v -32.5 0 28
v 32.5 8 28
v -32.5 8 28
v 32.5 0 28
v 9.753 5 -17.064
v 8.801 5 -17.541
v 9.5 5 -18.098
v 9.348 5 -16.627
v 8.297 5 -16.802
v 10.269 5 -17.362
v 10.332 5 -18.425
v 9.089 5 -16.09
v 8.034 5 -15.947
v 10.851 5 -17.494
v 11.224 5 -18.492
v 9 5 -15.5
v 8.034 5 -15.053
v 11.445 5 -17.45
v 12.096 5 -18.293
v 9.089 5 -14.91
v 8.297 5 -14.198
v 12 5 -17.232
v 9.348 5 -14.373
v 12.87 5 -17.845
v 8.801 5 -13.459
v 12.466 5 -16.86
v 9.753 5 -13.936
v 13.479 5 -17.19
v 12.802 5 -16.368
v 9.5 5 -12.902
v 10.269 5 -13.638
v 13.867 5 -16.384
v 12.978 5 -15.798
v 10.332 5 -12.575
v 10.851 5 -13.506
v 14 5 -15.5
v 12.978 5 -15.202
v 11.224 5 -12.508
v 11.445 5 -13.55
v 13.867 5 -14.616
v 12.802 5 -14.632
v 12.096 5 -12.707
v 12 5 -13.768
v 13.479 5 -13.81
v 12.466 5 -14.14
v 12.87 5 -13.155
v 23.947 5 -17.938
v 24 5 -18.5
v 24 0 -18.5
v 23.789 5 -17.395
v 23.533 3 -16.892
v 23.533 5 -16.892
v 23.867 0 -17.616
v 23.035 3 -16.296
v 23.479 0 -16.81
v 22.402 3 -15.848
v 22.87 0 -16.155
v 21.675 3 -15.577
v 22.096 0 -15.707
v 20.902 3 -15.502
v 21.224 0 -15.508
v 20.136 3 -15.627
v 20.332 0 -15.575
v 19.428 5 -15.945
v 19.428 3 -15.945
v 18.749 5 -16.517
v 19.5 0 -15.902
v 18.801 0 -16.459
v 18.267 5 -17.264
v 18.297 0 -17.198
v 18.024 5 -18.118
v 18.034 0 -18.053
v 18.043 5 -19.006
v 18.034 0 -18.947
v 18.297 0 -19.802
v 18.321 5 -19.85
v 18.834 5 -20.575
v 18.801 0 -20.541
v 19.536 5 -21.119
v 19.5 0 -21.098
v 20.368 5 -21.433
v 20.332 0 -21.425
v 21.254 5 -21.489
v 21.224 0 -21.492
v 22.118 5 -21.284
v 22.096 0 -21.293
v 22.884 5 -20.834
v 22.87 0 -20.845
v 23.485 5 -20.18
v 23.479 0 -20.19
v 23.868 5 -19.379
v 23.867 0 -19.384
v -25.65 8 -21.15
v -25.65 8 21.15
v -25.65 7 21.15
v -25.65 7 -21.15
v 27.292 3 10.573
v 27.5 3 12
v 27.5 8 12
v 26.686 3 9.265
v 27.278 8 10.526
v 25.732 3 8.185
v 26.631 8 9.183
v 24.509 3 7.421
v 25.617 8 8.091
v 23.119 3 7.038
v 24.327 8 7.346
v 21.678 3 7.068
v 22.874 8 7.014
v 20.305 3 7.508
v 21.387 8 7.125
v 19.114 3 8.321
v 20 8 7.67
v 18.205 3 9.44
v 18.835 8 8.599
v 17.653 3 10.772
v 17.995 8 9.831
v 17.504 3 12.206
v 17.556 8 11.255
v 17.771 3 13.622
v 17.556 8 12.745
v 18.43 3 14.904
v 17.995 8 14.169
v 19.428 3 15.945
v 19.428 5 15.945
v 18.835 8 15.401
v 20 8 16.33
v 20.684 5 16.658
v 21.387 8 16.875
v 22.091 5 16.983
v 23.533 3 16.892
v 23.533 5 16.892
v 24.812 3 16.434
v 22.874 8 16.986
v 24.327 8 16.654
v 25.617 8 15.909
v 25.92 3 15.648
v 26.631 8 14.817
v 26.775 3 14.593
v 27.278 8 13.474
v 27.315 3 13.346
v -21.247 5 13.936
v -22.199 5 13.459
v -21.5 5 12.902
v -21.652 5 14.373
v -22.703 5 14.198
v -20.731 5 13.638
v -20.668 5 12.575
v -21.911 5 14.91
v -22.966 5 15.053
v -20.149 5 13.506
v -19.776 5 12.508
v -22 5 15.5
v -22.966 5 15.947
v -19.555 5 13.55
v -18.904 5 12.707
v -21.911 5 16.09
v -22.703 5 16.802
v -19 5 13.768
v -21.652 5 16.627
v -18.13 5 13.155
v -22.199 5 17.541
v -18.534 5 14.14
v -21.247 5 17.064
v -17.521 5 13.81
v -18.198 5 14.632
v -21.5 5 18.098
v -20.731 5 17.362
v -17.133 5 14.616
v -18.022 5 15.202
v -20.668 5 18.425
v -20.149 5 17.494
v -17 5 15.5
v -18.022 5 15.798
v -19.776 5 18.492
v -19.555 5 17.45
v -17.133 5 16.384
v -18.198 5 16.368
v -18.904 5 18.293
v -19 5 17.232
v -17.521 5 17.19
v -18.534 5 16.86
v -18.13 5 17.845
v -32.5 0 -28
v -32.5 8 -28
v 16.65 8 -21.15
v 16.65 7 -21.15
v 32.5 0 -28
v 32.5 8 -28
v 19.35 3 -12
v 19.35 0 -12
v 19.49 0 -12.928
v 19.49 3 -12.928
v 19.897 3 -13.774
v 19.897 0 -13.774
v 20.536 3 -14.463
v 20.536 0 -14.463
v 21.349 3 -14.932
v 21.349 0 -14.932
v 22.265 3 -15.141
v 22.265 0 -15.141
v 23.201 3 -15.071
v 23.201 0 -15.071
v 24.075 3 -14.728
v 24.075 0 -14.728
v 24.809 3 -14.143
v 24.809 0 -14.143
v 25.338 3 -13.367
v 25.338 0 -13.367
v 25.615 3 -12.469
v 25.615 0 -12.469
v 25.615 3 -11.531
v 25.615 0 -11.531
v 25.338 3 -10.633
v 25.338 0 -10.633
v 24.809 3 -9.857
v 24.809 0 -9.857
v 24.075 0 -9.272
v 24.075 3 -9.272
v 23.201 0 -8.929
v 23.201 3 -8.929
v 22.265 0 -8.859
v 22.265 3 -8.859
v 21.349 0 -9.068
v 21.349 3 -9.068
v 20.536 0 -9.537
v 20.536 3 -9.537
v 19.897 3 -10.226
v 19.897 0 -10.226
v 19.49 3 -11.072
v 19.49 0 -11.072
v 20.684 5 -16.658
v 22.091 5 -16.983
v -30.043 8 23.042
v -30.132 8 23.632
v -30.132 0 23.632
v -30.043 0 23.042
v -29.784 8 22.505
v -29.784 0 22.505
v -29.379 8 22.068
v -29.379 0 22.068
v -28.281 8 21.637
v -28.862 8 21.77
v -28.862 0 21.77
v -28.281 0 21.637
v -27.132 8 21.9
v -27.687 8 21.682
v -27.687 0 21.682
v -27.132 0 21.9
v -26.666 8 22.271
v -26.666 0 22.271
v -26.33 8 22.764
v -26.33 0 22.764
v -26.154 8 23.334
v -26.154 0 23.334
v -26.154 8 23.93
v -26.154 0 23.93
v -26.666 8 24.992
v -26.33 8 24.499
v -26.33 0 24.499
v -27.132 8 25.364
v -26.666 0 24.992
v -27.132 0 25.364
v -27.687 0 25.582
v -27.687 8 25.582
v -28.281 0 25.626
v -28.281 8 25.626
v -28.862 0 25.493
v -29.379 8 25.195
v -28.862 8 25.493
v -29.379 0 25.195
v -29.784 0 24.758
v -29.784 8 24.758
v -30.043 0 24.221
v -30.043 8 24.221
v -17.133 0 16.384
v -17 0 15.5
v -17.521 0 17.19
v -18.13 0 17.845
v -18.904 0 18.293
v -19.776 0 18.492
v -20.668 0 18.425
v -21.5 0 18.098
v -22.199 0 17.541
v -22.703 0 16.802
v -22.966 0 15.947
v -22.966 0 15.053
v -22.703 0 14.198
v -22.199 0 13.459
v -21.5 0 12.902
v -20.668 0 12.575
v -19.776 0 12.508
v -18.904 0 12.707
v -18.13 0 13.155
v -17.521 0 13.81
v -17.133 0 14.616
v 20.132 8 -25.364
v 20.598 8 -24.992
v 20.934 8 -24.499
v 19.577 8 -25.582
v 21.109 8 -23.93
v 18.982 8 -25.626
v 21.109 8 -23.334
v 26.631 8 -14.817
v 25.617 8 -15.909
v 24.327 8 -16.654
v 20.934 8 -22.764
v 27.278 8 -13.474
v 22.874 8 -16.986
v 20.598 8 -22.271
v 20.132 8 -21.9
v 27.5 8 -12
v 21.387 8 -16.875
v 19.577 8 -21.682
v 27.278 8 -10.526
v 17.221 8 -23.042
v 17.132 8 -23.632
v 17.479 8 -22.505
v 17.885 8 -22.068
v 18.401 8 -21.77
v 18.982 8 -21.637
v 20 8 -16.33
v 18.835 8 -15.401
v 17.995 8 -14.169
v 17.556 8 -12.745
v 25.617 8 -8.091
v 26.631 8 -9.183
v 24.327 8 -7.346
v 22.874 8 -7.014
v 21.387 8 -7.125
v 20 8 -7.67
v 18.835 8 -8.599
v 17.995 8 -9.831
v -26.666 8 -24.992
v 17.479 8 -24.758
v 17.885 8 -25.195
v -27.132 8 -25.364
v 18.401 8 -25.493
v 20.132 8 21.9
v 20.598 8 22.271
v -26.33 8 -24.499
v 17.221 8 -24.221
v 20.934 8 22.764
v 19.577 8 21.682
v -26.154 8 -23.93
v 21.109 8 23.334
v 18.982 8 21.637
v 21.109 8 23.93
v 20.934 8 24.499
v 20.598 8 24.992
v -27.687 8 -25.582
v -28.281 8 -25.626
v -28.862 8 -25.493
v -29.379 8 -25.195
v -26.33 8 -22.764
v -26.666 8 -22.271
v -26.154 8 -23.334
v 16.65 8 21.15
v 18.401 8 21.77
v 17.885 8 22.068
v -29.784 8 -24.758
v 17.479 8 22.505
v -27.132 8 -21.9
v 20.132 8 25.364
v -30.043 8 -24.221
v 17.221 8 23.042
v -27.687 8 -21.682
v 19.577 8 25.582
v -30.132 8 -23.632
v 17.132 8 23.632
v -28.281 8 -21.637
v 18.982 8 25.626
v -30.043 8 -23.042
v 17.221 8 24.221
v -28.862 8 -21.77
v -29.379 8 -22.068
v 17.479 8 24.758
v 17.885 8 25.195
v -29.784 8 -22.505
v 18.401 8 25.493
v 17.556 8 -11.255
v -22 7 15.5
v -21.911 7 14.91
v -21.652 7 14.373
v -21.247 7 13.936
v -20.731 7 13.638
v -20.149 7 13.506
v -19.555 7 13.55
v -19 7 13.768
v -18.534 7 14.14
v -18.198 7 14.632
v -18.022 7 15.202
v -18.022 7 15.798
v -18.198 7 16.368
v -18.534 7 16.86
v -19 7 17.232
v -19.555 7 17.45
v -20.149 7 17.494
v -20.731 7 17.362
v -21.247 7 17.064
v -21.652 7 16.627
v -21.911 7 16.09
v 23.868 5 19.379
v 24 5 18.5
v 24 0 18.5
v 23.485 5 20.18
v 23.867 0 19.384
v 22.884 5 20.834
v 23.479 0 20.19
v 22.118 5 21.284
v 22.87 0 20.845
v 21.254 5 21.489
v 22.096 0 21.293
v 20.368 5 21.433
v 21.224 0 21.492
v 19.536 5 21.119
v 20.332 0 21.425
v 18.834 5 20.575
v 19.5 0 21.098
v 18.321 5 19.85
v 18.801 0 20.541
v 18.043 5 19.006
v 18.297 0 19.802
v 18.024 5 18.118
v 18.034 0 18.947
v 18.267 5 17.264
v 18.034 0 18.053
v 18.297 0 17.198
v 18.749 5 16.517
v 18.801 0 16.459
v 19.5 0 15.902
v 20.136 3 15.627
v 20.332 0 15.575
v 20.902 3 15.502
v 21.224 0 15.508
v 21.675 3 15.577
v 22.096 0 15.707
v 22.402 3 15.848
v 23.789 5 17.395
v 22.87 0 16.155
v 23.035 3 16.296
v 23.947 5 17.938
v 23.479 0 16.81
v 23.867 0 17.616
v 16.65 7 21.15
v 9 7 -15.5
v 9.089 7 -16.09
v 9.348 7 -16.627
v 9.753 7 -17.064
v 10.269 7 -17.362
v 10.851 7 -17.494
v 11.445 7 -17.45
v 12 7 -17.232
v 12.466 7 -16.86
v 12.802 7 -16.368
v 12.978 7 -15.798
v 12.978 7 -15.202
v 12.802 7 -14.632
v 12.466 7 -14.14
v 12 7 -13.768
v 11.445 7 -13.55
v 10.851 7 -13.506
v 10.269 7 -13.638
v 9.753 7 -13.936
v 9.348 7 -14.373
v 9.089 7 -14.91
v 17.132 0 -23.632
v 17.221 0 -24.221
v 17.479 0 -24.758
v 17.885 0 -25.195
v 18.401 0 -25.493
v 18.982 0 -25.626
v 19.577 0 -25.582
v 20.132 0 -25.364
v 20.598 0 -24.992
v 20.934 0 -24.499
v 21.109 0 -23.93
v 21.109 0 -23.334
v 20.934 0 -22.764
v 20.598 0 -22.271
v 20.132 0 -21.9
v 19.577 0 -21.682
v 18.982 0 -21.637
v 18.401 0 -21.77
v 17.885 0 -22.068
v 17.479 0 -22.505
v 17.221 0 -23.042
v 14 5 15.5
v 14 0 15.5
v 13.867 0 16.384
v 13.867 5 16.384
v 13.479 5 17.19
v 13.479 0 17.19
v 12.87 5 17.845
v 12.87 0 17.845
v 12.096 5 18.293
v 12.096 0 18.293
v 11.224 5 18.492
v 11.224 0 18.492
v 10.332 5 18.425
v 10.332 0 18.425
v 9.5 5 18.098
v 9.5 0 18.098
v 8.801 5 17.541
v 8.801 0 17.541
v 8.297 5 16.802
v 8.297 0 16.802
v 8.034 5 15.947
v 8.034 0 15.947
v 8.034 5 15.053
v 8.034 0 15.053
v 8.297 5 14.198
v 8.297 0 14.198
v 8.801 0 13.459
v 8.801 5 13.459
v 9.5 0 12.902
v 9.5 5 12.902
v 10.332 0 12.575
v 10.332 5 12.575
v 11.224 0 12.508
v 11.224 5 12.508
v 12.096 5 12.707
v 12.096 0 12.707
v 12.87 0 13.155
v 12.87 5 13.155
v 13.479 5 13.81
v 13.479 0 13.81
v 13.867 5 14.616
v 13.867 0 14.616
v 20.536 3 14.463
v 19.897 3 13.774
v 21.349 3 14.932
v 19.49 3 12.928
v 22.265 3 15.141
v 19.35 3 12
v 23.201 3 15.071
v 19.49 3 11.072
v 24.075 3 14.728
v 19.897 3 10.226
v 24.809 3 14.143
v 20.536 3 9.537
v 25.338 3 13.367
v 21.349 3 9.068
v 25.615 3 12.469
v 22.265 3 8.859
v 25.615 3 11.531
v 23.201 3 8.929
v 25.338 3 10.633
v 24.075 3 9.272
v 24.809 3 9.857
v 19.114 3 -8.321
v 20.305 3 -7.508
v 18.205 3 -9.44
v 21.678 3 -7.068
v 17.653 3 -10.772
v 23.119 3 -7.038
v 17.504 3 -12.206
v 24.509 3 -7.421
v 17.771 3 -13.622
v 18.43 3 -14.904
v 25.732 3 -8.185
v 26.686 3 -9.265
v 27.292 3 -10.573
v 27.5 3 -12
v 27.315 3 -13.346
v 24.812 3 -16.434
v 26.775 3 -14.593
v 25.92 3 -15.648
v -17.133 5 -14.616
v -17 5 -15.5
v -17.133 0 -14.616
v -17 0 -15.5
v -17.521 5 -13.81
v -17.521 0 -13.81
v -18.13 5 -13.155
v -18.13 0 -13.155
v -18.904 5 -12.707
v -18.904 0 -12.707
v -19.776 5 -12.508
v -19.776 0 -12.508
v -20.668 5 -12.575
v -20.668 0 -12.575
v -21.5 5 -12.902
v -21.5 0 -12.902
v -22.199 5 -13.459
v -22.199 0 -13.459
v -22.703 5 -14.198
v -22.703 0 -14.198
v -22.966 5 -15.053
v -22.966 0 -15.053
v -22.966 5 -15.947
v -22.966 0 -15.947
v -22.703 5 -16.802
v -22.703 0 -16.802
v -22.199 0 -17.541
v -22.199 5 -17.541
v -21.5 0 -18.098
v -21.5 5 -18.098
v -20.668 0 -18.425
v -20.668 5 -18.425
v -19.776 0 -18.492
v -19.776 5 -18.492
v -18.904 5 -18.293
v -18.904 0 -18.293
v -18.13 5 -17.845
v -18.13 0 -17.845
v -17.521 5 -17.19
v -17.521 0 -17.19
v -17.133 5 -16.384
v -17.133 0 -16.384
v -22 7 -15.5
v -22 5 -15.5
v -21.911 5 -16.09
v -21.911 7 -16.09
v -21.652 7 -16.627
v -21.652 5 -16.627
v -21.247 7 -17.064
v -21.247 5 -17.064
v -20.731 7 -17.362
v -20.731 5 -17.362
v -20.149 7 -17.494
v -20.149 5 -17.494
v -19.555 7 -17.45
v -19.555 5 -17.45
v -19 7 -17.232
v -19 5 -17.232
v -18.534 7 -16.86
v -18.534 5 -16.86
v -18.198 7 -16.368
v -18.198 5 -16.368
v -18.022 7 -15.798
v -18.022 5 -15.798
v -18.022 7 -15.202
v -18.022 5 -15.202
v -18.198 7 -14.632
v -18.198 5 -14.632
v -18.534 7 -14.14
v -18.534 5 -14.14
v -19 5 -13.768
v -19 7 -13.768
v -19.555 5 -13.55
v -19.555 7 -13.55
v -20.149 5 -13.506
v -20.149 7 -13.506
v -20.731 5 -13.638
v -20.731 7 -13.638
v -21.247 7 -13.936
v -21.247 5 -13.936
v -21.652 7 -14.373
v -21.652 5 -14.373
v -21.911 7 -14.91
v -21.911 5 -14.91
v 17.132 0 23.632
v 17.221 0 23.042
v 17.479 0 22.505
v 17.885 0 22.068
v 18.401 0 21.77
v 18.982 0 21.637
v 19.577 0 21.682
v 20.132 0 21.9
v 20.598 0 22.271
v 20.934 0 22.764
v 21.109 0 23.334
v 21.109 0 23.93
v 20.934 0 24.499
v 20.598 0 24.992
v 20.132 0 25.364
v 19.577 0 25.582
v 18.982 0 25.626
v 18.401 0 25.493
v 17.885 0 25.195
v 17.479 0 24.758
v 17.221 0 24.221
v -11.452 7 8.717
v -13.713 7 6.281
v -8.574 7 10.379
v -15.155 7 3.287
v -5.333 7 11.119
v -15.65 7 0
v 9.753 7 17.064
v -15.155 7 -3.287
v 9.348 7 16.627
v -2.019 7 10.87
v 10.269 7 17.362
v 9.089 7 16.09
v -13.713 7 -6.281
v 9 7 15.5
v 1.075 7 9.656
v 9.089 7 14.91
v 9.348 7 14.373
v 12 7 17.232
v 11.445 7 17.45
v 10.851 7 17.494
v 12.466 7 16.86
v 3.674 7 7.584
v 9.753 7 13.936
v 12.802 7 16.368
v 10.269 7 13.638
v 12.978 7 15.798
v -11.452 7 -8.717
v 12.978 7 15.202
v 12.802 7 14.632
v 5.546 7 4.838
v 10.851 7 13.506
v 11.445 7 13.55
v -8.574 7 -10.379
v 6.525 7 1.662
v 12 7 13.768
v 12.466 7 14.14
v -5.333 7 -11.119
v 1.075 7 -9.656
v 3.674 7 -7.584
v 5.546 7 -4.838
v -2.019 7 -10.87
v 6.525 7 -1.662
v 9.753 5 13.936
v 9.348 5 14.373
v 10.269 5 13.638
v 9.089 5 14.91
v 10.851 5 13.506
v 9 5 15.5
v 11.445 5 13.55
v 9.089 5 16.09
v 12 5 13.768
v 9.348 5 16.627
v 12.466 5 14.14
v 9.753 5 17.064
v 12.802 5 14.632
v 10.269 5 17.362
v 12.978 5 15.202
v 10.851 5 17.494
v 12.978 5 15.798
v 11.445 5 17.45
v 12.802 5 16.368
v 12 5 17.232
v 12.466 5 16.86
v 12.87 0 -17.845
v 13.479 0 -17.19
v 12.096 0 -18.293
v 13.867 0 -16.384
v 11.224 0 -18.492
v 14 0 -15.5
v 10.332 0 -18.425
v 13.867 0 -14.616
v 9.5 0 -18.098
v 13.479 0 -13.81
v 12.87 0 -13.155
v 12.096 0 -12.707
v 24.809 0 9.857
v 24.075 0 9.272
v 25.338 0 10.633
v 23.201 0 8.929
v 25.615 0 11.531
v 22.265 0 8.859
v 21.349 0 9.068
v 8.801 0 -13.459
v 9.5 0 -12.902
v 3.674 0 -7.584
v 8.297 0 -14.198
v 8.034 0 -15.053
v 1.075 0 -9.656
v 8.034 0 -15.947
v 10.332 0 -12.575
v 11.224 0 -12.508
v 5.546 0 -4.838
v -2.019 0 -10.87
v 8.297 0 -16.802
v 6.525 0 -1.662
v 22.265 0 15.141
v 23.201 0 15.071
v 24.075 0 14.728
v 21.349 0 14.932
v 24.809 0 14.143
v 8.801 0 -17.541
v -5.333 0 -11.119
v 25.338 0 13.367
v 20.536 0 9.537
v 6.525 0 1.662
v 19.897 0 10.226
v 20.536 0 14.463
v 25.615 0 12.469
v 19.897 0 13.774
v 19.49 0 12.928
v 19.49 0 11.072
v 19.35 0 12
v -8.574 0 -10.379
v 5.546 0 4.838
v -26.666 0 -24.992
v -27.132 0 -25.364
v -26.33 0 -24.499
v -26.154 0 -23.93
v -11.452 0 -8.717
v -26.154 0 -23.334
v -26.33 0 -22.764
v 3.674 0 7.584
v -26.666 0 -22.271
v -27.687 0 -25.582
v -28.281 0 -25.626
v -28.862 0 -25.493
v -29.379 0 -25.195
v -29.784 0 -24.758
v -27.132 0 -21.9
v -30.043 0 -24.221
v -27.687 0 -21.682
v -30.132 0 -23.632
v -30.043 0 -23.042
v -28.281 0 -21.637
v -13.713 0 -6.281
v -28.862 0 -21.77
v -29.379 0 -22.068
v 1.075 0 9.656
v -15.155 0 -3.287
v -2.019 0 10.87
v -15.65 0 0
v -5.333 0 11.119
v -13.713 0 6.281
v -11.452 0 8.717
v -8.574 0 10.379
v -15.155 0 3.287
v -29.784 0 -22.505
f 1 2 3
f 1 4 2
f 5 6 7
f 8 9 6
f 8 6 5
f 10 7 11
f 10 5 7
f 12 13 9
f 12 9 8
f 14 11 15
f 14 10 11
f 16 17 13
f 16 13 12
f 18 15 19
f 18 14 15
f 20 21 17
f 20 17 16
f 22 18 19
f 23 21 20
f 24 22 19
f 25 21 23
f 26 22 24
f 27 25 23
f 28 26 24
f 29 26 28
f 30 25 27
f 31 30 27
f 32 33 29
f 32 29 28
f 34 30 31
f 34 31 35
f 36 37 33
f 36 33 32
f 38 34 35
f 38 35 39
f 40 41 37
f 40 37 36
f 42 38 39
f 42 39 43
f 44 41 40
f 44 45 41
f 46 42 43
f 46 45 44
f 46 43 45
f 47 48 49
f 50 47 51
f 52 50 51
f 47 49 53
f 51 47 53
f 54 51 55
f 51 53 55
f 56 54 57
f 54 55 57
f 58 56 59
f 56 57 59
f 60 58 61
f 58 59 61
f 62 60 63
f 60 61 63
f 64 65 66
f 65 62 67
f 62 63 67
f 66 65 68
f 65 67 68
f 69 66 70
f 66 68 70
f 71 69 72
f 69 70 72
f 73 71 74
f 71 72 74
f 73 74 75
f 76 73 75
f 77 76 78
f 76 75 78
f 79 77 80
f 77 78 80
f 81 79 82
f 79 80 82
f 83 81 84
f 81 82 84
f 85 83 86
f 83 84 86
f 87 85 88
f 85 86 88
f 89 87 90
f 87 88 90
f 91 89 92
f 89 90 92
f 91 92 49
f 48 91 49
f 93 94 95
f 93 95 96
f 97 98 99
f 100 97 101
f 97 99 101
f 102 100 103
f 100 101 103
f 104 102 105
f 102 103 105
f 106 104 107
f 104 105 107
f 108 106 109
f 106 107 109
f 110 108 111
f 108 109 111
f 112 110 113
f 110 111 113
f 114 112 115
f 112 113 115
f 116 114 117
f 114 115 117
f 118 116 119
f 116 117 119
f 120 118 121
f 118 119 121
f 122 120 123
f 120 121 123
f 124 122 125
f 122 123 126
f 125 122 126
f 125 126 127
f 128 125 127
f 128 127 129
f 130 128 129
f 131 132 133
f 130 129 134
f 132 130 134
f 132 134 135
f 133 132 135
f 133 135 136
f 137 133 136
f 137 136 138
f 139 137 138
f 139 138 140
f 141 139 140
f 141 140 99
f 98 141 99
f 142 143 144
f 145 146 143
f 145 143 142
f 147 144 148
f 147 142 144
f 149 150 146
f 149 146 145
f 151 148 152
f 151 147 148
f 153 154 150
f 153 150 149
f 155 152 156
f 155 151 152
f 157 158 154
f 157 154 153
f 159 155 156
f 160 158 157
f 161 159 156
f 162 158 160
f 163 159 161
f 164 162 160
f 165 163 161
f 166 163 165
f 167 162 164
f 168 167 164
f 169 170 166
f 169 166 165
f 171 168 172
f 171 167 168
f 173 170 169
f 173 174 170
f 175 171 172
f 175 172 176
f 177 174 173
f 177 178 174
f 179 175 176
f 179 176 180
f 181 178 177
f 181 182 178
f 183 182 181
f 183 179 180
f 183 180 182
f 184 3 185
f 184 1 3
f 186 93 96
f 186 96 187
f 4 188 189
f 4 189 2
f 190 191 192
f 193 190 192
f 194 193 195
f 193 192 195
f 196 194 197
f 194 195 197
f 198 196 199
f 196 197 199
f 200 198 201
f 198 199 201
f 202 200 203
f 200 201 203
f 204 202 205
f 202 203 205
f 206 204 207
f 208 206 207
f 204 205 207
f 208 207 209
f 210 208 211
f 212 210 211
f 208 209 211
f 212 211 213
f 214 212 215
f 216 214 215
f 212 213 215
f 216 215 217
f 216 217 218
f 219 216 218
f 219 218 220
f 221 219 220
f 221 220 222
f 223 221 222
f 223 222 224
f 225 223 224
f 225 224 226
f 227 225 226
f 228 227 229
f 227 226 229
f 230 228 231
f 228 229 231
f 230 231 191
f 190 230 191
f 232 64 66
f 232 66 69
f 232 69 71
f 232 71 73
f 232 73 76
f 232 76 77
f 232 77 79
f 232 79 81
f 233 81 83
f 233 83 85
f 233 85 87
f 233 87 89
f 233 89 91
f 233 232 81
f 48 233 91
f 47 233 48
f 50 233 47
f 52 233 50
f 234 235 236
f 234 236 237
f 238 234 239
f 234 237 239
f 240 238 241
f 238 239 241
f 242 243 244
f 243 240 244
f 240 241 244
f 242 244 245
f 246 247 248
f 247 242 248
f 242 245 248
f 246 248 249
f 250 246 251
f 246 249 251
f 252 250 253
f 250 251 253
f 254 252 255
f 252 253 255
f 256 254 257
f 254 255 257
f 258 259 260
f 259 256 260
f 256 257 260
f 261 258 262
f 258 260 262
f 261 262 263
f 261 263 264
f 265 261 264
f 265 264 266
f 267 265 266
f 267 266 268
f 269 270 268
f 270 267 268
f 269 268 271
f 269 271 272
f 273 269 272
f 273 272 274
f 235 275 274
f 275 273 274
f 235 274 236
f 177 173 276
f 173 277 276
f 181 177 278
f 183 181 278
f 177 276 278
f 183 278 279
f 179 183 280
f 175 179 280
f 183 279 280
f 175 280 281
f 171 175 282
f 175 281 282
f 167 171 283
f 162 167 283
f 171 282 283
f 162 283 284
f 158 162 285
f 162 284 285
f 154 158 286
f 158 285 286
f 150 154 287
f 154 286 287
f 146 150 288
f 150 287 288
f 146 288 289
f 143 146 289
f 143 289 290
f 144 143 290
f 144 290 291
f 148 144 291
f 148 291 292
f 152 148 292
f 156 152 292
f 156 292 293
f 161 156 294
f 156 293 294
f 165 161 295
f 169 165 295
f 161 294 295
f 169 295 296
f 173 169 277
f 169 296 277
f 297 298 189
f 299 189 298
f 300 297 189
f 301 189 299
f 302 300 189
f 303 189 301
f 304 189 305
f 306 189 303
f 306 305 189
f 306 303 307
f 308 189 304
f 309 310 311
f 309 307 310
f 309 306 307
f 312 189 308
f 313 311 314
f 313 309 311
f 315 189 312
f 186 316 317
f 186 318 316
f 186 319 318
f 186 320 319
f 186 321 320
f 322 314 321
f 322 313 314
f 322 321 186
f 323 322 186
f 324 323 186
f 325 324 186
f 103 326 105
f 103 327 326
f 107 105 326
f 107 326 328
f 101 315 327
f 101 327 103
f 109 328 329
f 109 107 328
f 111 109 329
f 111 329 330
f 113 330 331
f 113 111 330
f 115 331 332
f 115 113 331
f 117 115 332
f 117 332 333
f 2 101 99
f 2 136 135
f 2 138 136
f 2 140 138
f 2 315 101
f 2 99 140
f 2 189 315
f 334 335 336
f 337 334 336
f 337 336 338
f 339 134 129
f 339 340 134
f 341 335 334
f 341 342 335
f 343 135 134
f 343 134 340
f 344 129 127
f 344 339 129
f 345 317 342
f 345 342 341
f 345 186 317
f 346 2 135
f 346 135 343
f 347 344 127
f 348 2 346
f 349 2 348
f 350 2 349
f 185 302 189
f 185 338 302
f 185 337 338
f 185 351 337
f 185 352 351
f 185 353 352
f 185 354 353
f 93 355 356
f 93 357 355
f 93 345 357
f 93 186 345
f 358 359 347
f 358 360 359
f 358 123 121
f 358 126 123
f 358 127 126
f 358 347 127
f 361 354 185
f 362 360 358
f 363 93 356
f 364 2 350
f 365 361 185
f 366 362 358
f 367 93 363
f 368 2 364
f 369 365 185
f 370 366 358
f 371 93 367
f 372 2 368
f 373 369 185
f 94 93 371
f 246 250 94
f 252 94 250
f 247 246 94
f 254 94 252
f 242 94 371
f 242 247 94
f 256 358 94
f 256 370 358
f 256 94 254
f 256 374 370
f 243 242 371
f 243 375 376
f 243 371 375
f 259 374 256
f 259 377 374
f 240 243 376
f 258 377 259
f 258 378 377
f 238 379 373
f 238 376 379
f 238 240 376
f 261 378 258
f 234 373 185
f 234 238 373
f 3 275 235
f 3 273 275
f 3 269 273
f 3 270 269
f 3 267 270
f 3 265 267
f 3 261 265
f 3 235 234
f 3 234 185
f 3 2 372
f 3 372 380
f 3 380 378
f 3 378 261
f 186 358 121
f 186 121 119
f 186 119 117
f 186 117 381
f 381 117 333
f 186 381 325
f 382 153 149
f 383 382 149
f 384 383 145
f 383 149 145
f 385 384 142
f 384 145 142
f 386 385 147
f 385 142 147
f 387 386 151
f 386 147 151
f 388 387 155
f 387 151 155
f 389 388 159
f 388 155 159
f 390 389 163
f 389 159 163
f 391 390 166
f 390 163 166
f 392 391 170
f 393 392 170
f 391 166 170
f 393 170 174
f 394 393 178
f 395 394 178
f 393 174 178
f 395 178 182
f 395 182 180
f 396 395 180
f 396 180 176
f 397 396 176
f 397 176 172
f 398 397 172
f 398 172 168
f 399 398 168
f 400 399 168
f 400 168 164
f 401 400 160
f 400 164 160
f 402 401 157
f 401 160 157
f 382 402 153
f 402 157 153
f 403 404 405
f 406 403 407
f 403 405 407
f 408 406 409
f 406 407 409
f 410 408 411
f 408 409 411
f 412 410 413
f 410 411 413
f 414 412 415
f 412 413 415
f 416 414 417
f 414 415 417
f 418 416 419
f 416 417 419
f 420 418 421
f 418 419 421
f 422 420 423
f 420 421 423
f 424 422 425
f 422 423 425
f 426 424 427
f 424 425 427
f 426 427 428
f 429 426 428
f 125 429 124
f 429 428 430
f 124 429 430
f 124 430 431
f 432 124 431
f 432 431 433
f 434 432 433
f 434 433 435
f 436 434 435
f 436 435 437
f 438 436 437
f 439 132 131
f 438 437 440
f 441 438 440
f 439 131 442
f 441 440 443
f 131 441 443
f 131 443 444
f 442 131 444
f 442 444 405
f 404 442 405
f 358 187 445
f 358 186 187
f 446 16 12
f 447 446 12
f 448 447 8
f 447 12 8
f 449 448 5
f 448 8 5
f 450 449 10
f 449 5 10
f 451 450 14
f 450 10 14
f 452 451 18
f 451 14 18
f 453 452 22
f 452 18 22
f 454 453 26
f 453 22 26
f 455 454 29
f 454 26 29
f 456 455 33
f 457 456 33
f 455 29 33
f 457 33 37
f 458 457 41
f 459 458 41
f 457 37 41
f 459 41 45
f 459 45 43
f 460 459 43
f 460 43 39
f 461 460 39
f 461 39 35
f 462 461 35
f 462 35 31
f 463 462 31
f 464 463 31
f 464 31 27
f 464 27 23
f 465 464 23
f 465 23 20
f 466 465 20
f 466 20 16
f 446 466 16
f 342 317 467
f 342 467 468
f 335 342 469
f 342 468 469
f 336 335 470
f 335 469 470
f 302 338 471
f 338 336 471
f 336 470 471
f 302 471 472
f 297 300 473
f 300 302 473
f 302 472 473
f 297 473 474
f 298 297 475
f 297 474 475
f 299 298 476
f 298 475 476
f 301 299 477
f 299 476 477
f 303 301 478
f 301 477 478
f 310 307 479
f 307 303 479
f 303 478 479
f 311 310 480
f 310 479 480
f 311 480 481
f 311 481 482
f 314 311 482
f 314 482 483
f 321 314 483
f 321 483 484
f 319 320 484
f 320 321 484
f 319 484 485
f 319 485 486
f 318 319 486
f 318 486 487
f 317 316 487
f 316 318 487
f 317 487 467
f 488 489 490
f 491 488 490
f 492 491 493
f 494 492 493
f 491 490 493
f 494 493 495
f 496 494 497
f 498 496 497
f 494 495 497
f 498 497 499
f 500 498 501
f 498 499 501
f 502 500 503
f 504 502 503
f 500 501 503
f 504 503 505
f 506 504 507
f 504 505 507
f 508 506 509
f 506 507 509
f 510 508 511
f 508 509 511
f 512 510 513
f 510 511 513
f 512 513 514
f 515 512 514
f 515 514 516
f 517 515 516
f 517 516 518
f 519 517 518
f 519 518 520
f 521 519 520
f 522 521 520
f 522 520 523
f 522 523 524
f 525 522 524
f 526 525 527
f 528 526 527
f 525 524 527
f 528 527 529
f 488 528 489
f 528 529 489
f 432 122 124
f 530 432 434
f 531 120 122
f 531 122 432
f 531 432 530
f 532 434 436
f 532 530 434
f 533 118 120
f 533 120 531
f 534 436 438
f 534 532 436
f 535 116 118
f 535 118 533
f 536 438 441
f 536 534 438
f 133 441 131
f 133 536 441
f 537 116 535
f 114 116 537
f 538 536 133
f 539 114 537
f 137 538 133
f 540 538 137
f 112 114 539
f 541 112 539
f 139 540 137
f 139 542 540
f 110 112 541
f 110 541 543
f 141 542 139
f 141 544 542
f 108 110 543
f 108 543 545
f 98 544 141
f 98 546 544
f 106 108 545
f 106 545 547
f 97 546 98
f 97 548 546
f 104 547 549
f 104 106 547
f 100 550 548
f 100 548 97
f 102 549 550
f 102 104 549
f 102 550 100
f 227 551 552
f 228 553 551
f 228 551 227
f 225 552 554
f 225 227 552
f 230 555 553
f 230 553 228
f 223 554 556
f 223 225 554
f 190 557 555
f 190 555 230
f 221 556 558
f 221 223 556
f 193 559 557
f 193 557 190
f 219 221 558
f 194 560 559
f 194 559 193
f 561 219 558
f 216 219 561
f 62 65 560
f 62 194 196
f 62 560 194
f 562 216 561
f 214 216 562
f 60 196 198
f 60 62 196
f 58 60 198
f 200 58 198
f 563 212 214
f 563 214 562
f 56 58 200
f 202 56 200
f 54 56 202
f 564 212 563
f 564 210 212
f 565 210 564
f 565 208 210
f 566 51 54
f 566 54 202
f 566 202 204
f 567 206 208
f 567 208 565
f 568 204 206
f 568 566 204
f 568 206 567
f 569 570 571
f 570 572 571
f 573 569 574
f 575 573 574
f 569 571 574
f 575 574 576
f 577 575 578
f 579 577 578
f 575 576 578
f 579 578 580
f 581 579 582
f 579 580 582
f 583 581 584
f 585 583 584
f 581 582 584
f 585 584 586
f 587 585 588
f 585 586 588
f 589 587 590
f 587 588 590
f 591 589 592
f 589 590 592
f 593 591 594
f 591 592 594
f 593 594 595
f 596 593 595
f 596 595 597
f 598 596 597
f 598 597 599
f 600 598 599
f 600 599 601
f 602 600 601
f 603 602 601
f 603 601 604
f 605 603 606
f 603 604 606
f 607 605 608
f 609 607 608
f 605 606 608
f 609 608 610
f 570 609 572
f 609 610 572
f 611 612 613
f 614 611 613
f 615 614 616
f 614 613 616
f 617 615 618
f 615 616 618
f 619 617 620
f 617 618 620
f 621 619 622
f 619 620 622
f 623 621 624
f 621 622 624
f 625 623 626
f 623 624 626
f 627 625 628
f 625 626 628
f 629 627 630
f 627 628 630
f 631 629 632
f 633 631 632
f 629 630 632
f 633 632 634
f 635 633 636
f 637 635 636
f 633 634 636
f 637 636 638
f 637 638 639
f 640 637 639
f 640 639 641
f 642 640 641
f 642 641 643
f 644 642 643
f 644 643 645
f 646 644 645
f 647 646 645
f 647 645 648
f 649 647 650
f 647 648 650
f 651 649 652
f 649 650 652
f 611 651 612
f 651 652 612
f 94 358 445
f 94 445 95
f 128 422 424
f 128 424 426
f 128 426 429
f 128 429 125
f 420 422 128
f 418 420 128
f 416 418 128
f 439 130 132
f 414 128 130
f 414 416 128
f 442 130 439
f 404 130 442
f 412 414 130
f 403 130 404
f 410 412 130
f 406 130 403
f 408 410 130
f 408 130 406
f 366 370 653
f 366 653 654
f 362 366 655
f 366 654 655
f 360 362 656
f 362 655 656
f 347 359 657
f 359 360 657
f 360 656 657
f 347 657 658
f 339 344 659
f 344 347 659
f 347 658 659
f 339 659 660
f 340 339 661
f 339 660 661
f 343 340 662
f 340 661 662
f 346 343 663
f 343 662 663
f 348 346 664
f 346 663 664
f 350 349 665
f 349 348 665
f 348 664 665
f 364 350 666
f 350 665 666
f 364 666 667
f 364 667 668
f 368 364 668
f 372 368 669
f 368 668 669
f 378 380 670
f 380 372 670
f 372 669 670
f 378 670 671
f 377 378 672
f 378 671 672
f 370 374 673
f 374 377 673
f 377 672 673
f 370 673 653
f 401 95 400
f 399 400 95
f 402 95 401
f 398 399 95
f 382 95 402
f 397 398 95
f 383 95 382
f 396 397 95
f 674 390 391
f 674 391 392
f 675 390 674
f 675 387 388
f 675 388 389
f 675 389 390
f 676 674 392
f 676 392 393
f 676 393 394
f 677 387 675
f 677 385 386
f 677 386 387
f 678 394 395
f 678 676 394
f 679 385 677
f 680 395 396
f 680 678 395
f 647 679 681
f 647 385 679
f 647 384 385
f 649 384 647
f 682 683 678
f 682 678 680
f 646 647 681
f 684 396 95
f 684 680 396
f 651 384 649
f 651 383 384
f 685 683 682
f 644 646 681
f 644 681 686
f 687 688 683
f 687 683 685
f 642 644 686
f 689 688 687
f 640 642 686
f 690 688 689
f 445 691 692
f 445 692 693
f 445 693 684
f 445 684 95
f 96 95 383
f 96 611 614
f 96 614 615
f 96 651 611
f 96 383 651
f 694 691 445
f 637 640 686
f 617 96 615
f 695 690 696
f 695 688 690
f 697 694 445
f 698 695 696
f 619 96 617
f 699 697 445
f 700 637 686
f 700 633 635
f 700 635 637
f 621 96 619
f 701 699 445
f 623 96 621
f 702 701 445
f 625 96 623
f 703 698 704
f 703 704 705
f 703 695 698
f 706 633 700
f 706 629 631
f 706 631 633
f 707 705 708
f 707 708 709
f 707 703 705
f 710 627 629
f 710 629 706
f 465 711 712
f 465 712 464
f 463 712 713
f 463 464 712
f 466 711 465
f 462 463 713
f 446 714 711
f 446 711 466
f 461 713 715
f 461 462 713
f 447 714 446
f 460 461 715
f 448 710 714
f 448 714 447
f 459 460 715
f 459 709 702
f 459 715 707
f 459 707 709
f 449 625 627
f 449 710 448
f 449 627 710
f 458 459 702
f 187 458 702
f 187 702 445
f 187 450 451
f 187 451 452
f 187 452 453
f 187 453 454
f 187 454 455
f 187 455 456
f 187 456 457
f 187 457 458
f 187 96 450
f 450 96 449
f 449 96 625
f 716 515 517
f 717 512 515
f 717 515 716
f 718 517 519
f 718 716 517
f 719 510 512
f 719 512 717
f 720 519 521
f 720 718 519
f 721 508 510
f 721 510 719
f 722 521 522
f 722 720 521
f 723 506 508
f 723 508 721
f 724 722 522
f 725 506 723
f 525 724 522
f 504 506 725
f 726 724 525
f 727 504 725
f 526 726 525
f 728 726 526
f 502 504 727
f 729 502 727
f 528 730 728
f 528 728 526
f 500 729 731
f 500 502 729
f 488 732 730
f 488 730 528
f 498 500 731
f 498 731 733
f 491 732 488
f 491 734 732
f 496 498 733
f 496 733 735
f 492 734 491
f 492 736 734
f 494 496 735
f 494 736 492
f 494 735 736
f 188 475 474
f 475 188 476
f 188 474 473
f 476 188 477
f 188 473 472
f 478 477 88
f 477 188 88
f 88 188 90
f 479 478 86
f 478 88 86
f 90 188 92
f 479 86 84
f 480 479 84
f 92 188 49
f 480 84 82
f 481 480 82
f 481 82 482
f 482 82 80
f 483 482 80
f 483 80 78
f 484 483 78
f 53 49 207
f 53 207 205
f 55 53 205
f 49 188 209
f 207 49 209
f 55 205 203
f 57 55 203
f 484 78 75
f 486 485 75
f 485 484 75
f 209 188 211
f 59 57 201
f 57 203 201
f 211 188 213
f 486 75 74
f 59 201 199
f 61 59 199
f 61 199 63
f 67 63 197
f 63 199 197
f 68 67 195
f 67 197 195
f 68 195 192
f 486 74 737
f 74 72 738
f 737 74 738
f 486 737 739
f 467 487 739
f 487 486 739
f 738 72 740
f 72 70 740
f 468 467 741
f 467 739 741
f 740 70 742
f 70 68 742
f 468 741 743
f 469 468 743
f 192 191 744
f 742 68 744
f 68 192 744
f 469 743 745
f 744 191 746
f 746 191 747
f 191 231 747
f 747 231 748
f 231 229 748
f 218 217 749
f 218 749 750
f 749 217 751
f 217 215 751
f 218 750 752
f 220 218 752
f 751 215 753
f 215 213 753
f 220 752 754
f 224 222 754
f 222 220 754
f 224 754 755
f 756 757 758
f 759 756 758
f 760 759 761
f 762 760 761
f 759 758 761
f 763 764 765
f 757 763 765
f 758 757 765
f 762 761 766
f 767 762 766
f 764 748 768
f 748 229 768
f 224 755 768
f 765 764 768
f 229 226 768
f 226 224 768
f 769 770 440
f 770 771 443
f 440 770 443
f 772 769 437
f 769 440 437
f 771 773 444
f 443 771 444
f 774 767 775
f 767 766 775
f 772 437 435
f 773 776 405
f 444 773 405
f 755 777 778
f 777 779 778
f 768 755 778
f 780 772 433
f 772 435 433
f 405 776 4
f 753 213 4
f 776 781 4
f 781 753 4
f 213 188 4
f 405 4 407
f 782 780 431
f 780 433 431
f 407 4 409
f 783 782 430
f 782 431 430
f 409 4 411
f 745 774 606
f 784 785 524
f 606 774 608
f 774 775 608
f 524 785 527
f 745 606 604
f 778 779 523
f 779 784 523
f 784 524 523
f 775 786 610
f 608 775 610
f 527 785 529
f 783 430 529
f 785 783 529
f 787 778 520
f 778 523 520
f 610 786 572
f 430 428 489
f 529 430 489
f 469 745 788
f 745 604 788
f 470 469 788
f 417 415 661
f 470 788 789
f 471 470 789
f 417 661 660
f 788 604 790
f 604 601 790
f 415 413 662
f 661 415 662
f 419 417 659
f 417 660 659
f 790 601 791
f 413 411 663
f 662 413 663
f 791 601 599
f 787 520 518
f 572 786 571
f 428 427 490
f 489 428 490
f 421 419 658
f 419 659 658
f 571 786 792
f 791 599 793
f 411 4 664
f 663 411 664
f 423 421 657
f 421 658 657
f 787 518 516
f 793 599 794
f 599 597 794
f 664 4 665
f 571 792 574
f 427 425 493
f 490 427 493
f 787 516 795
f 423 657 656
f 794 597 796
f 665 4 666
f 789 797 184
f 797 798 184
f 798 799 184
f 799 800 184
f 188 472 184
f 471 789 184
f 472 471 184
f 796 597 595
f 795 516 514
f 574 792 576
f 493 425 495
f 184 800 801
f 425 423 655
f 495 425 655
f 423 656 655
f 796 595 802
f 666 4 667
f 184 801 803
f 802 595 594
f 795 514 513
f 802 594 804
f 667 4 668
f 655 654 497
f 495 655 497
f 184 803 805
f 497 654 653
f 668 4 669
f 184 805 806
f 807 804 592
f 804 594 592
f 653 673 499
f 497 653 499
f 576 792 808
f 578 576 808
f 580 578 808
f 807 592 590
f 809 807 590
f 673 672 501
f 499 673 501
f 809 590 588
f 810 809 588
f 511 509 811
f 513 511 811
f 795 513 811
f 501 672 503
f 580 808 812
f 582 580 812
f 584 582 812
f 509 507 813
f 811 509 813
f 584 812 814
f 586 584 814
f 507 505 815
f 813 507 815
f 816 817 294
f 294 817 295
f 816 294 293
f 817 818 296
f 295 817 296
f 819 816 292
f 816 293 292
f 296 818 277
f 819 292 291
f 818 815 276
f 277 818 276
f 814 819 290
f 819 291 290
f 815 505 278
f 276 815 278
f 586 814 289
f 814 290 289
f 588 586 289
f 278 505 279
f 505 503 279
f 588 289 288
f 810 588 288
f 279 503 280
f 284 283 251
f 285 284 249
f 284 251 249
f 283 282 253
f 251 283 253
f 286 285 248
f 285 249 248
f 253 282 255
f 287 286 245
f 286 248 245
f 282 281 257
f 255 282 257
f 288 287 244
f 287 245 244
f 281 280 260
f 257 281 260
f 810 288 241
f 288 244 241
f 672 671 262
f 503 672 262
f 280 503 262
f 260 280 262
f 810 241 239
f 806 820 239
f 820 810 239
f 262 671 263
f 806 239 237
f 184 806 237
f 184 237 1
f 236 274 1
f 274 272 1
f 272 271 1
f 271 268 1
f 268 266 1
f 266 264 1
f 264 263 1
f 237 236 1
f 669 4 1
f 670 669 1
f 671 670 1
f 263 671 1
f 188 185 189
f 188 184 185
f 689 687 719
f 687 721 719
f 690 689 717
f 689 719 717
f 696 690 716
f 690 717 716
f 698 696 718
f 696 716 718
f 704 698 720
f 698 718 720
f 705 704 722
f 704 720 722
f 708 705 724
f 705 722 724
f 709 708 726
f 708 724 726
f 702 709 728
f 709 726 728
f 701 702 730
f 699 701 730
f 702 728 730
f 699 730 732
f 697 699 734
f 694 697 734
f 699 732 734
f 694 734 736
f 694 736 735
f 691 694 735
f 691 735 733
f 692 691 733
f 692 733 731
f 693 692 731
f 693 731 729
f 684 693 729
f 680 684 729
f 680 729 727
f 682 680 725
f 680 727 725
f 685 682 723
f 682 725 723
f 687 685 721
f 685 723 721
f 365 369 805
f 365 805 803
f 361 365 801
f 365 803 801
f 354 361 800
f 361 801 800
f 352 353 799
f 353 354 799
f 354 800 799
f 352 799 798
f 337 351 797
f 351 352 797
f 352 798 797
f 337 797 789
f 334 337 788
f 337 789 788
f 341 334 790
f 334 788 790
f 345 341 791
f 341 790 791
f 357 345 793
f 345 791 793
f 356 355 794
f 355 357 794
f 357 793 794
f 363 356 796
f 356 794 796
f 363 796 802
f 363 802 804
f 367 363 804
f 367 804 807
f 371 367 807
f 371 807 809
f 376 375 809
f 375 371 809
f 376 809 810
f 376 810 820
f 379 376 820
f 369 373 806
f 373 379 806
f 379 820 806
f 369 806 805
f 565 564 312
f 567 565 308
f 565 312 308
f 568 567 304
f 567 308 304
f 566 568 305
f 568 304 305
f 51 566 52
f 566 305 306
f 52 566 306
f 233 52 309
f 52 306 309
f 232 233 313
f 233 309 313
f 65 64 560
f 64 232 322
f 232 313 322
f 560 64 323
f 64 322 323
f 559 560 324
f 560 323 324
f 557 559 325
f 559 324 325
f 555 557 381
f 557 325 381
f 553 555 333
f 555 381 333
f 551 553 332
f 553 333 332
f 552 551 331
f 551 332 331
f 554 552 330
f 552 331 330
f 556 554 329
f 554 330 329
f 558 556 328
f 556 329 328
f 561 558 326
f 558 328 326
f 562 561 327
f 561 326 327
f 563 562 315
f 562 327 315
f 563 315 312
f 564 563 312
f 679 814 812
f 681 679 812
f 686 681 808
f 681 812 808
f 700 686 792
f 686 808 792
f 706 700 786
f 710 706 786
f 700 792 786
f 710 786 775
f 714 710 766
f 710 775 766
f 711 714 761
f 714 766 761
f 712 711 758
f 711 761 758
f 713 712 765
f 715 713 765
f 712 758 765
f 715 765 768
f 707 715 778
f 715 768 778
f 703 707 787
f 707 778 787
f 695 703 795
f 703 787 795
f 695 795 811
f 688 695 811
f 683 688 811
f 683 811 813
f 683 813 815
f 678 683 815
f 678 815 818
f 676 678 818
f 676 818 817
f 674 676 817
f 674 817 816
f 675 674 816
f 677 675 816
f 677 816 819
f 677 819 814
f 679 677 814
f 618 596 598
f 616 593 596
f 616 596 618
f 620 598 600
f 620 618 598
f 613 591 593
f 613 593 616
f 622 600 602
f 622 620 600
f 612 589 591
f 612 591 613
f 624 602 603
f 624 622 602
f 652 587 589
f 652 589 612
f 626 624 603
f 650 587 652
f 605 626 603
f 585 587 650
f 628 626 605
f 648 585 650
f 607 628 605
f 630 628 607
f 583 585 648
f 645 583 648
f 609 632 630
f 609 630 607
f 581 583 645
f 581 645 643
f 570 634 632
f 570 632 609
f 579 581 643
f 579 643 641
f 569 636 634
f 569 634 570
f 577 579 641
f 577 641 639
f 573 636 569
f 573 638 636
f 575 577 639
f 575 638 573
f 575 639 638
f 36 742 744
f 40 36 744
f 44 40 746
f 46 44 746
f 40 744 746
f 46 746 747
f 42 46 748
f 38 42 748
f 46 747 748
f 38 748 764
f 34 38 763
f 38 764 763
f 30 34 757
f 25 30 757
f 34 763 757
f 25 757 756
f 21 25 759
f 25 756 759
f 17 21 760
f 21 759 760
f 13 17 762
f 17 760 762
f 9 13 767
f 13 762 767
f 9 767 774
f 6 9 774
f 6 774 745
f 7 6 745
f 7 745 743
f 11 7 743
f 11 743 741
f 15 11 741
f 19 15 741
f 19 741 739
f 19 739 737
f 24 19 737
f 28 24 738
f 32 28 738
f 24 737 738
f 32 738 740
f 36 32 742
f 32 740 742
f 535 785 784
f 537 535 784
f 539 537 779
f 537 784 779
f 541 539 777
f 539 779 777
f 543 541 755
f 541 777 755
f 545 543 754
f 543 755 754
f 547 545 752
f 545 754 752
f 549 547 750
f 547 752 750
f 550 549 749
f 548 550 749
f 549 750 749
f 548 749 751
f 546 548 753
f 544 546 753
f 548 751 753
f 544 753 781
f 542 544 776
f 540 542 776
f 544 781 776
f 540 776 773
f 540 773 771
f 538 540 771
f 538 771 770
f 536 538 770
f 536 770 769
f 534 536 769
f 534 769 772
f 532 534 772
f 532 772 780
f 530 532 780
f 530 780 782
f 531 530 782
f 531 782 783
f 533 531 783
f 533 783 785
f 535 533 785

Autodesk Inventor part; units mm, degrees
ref_plane "YZ Plane" through (0, 0, 0) normal (1, 0, 0) x (0, 1, 0)
ref_plane "XZ Plane" through (0, 0, 0) normal (0, 1, 0) x (-1, 0, 0)
ref_plane "XY Plane" through (0, 0, 0) normal (0, 0, 1) x (1, 0, 0)
sketch "Sketch1" plane through (0, 0, 0) normal (0, 1, 0) x (-1, 0, 0)
  line L0 (-32.5, 28) -> (32.5, 28)
  line L1 (32.5, 28) -> (32.5, -28)
  line L2 (32.5, -28) -> (-32.5, -28)
  line L3 (-32.5, -28) -> (-32.5, 28)
  line L4 (-32.5, 28) -> (32.5, -28) construction
  line L5 (32.5, 28) -> (-32.5, -28) construction
  circle A0 centre (4.5, 0) radius 11.15
  line L6 (-11, 15.5) -> (20, 15.5) construction
  line L7 (20, 15.5) -> (20, -15.5) construction
  line L8 (20, -15.5) -> (-11, -15.5) construction
  line L9 (-11, -15.5) -> (-11, 15.5) construction
  line L10 (-11, 15.5) -> (20, -15.5) construction
  line L11 (20, 15.5) -> (-11, -15.5) construction
  circle A1 centre (20, 15.5) radius 2
  line L12 (-11, 15.5) -> (20, 15.5) construction
  line L13 (20, 15.5) -> (20, -15.5) construction
  line L14 (20, -15.5) -> (-11, -15.5) construction
  line L15 (-11, -15.5) -> (-11, 15.5) construction
  circle A2 centre (-11, 15.5) radius 2
  line L16 (-11, -15.5) -> (-11, 15.5) construction
  line L17 (-11, 15.5) -> (20, 15.5) construction
  line L18 (20, 15.5) -> (20, -15.5) construction
  line L19 (20, -15.5) -> (-11, -15.5) construction
  circle A3 centre (-11, -15.5) radius 2
  line L20 (20, -15.5) -> (-11, -15.5) construction
  line L21 (-11, -15.5) -> (-11, 15.5) construction
  line L22 (-11, 15.5) -> (20, 15.5) construction
  line L23 (20, 15.5) -> (20, -15.5) construction
  circle A4 centre (20, -15.5) radius 2
  circle A5 centre (28.1317, 23.6317) radius 2
  line L24 (28.1317, 23.6317) -> (20, 15.5) construction
  circle A6 centre (-19.1317, 23.6317) radius 2
  circle A7 centre (-19.1317, -23.6317) radius 2
  circle A8 centre (28.1317, -23.6317) radius 2
  circle A9 centre (-22.5, -12) radius 3.15
  line L25 (32.5, 0) -> (-32.5, 0) construction
  circle A10 centre (-22.5, 12) radius 3.15
  point P0 (0, 0)
  point P1 (0, 0)
  dimension "d0" = 56
  dimension "d1" = 65
  dimension "d2" = 28
  dimension "d3" = 22.3
  dimension "d4" = 31
  dimension "d5" = 31
  dimension "d8" = 360
  dimension "d10" = 4
  dimension "d11" = 11.5
  dimension "d12" = 4
  dimension "d15" = 360
  dimension "d17" = 16
  dimension "d18" = 10
  dimension "d19" = 6.3
extrude "Extrusion1" add sketch "Sketch1" along normal blind 8
sketch "Sketch2" plane through (0, 8, 0) normal (0, 1, 0) x (1, 0, 0)
  circle A0 centre (-4.5, 0) radius 11.15 construction
  line L0 (16.65, -21.15) -> (-25.65, -21.15)
  line L1 (-25.65, -21.15) -> (-25.65, 21.15)
  line L2 (-25.65, 21.15) -> (16.65, 21.15)
  line L3 (16.65, 21.15) -> (16.65, -21.15)
  line L4 (16.65, -21.15) -> (-25.65, 21.15) construction
  line L5 (-25.65, -21.15) -> (16.65, 21.15) construction
  point P0 (0, 0)
  dimension "d22" = 42.3
  dimension "d23" = 42.3
extrude "Extrusion2" cut sketch "Sketch2" against normal blind 1
sketch "Sketch3" plane through (0, 8, 0) normal (0, 1, 0) x (1, 0, 0)
  circle A0 centre (22.5, -12) radius 3.15 construction
  circle A1 centre (22.5, 12) radius 3.15 construction
  circle A2 centre (22.5, -12) radius 5
  circle A3 centre (22.5, 12) radius 5
  point P0 (0, 0)
  dimension "d26" = 10
  dimension "d27" = 10
extrude "Extrusion3" cut sketch "Sketch3" against normal blind 5
sketch "Sketch4" plane through (0, 0, 0) normal (0, -1, 0) x (1, 0, 0)
  line L0 (32.5, -28) -> (-32.5, -28) projected
  line L1 (32.5, 28) -> (32.5, -28) projected
  line L2 (-32.5, 28) -> (32.5, 28) projected
  line L3 (-32.5, -28) -> (-32.5, 28) projected
  circle A0 centre (22.5, 12) radius 3.15 projected
  circle A1 centre (-28.1317, -23.6317) radius 2 projected
  circle A2 centre (-4.5, 0) radius 11.15 projected
  circle A3 centre (-20, 15.5) radius 2 projected
  circle A4 centre (11, 15.5) radius 2 projected
  circle A5 centre (11, -15.5) radius 2 projected
  circle A6 centre (-20, -15.5) radius 2 projected
  circle A7 centre (-28.1317, 23.6317) radius 2 projected
  circle A8 centre (19.1317, 23.6317) radius 2 projected
  circle A9 centre (19.1317, -23.6317) radius 2 projected
  circle A10 centre (22.5, -12) radius 3.15 projected
  circle A11 centre (-20, 15.5) radius 3
  circle A12 centre (-20, -15.5) radius 3
  circle A13 centre (11, -15.5) radius 3
  circle A14 centre (11, 15.5) radius 3
  circle A15 centre (21, 18.5) radius 3
  line L4 (-32.5, -28) -> (-32.5, 28) projected
  line L5 (-32.5, 0) -> (32.5, 0) construction
  circle A16 centre (21, -18.5) radius 3
  point P0 (0, 0)
  dimension "d30" = 6
  dimension "d33" = 360
  dimension "d35" = 9.5
  dimension "d36" = 11.5
  dimension "d37" = 6
extrude "Extrusion4" cut sketch "Sketch4" against normal blind 5 contours A3 | A4 | A5 | A6 | A11 | A12 | A13 | A14 | A15 | A16
properties part number "Linear Rail Front Plate"
